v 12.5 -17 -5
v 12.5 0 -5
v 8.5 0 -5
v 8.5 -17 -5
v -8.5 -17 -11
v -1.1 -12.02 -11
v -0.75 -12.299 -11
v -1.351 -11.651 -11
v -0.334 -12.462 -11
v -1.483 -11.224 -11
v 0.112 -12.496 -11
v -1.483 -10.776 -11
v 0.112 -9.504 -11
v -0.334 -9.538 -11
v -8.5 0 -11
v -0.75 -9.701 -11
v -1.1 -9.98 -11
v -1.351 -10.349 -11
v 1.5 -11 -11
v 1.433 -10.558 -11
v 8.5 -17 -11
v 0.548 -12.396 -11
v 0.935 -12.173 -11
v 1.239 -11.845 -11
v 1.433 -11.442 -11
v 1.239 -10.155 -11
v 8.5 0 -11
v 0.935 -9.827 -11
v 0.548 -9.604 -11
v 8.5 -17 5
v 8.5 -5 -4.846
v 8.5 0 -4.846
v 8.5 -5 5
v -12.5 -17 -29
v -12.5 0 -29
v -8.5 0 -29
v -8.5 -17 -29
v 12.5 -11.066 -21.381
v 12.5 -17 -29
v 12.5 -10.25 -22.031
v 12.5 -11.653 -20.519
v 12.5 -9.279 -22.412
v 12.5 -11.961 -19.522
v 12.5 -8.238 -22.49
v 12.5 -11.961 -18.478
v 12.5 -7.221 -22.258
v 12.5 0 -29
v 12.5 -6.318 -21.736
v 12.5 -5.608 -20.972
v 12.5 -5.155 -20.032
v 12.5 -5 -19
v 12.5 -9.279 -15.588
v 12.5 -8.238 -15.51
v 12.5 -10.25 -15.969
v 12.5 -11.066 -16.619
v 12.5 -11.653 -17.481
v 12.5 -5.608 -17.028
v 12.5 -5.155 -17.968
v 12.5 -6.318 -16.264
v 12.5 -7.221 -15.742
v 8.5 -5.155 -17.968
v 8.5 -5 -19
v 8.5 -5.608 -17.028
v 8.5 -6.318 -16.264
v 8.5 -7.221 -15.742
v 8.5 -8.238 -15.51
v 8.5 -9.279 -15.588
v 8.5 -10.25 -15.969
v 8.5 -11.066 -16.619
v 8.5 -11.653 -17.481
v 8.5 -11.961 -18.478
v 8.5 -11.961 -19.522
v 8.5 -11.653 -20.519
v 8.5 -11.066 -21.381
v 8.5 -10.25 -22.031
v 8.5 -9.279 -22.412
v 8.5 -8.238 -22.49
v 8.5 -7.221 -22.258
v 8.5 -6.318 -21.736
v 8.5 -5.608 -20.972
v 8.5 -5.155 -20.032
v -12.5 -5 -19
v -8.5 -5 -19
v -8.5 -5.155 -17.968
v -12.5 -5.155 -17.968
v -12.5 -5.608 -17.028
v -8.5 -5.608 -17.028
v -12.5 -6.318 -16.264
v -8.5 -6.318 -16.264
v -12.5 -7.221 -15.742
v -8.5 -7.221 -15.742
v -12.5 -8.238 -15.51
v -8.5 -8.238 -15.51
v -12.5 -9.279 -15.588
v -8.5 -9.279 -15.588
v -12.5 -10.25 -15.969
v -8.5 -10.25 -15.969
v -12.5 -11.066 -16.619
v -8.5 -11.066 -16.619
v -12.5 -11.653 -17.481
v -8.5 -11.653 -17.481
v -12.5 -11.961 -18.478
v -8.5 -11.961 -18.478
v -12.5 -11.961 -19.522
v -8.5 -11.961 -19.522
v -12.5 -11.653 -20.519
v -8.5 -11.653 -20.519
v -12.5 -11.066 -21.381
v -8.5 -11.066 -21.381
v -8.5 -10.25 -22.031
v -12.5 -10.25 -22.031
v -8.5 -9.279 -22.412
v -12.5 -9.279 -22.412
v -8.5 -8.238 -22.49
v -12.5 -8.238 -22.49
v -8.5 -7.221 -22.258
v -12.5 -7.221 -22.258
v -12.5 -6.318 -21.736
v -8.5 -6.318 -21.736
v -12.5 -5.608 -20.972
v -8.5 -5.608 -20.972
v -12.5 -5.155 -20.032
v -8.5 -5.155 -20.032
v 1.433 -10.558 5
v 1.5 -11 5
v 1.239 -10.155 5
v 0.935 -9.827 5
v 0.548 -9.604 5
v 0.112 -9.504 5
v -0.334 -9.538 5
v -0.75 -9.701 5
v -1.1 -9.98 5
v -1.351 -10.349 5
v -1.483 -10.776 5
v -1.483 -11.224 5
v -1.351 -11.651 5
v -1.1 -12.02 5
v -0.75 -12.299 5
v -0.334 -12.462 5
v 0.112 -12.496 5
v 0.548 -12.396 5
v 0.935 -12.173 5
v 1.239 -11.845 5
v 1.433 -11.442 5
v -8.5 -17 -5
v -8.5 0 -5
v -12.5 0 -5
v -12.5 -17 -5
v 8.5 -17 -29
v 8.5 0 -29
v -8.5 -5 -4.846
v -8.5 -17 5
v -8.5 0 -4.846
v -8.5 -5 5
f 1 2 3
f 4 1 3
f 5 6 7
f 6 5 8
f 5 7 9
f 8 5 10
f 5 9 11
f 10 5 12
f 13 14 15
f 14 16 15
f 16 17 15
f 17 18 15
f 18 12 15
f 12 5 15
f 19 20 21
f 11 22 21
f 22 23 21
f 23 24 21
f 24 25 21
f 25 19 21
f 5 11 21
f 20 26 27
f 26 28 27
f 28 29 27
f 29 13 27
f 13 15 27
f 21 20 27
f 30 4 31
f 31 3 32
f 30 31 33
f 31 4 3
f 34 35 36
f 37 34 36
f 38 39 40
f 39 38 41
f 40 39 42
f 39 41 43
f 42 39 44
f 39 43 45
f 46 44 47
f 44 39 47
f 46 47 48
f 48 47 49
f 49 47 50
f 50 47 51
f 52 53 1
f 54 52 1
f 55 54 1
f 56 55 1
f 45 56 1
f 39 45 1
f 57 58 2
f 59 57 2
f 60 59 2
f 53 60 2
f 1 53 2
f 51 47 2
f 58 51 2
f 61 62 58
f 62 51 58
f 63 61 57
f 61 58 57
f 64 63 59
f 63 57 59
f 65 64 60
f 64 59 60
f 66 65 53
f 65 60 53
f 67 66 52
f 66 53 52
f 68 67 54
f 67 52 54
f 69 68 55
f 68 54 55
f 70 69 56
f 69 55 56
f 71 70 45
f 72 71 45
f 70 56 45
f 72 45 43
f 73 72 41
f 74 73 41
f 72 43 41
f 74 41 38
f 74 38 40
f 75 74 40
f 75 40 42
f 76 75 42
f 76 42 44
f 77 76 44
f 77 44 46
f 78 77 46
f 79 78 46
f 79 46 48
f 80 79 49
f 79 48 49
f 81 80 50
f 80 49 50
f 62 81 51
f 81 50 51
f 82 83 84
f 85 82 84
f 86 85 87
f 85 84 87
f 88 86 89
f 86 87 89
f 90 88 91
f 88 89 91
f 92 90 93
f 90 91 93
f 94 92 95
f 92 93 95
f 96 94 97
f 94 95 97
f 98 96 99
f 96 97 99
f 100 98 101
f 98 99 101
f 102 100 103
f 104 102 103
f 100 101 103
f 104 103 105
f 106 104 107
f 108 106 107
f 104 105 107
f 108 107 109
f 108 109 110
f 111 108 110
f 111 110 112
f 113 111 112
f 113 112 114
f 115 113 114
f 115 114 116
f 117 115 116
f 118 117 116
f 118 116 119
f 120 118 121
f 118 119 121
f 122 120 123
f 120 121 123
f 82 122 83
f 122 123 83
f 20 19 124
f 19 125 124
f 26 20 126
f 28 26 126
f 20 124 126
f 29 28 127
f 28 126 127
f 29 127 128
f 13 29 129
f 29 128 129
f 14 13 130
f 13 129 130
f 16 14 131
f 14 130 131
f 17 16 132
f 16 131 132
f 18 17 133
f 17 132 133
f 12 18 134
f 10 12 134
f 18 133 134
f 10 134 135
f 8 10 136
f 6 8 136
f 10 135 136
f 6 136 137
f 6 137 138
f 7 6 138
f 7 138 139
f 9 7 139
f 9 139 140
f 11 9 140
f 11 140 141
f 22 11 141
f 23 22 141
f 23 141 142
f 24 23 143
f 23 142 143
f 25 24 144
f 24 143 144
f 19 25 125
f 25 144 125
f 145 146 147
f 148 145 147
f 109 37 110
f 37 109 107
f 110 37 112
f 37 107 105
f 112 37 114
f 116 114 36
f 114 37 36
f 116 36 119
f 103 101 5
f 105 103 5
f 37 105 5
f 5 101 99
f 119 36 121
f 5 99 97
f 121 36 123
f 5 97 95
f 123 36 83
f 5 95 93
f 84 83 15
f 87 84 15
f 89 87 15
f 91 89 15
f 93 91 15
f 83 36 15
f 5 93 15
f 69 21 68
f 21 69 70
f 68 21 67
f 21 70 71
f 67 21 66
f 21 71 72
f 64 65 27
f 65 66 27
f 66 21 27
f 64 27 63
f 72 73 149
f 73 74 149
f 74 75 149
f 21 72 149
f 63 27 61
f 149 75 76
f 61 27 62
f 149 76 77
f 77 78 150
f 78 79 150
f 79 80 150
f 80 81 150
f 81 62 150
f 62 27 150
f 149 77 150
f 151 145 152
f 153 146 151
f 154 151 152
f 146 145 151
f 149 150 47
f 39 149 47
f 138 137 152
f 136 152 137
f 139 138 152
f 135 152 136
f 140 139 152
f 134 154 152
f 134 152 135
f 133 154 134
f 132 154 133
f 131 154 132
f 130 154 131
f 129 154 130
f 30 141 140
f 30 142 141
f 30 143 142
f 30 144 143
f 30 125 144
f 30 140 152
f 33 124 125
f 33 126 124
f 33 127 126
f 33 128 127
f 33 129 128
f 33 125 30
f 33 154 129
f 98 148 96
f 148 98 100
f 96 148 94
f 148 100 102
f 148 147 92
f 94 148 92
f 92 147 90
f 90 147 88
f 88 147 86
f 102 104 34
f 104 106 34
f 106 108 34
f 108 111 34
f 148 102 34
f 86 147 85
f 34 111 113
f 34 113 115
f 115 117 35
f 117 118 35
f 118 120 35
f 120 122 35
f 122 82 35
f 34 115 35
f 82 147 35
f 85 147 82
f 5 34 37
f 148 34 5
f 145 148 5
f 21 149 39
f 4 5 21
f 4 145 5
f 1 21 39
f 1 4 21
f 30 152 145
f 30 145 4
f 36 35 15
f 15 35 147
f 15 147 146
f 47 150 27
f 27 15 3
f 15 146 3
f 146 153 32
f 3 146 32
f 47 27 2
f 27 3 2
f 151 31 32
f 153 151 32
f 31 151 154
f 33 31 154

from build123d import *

# Parameters (mm, degrees)
F0_W     = 17
F0_H     = 10
F1_DEPTH = 17
F2_W     = 5
F2_H     = 10
F2_R     = 3.5
F3_DEPTH = 12.5
F4_R     = 1.5
F5_DEPTH = 20


with BuildPart() as f1:
    # F0 (on Front) → F1 (new body)
    with BuildSketch(Plane.XZ):
        Rectangle(F0_W, F0_H)
        Polygon((8.5, -5), (-8.5, -5), (-12.5, -5), (-12.5, -29), (-8.5, -29), (-8.5, -11), (8.5, -11), (8.5, -29), (12.5, -29), (12.5, -5), align=None)
    extrude(amount=F1_DEPTH)

    # F2 (on Right) → F3 (cut, symmetric)
    with BuildSketch(Plane.YZ):
        with Locations((-2.5, 0.153744)):
            Rectangle(F2_W, F2_H)
        with Locations((-8.5, -19)):
            Circle(F2_R)
    extrude(amount=F3_DEPTH, both=True, mode=Mode.SUBTRACT)

    # F4 (on Top) → F5 (cut, symmetric)
    with BuildSketch(Plane.XY):
        with Locations((0, -11)):
            Circle(F4_R)
    extrude(amount=F5_DEPTH, both=True, mode=Mode.SUBTRACT)


solid = f1.part
